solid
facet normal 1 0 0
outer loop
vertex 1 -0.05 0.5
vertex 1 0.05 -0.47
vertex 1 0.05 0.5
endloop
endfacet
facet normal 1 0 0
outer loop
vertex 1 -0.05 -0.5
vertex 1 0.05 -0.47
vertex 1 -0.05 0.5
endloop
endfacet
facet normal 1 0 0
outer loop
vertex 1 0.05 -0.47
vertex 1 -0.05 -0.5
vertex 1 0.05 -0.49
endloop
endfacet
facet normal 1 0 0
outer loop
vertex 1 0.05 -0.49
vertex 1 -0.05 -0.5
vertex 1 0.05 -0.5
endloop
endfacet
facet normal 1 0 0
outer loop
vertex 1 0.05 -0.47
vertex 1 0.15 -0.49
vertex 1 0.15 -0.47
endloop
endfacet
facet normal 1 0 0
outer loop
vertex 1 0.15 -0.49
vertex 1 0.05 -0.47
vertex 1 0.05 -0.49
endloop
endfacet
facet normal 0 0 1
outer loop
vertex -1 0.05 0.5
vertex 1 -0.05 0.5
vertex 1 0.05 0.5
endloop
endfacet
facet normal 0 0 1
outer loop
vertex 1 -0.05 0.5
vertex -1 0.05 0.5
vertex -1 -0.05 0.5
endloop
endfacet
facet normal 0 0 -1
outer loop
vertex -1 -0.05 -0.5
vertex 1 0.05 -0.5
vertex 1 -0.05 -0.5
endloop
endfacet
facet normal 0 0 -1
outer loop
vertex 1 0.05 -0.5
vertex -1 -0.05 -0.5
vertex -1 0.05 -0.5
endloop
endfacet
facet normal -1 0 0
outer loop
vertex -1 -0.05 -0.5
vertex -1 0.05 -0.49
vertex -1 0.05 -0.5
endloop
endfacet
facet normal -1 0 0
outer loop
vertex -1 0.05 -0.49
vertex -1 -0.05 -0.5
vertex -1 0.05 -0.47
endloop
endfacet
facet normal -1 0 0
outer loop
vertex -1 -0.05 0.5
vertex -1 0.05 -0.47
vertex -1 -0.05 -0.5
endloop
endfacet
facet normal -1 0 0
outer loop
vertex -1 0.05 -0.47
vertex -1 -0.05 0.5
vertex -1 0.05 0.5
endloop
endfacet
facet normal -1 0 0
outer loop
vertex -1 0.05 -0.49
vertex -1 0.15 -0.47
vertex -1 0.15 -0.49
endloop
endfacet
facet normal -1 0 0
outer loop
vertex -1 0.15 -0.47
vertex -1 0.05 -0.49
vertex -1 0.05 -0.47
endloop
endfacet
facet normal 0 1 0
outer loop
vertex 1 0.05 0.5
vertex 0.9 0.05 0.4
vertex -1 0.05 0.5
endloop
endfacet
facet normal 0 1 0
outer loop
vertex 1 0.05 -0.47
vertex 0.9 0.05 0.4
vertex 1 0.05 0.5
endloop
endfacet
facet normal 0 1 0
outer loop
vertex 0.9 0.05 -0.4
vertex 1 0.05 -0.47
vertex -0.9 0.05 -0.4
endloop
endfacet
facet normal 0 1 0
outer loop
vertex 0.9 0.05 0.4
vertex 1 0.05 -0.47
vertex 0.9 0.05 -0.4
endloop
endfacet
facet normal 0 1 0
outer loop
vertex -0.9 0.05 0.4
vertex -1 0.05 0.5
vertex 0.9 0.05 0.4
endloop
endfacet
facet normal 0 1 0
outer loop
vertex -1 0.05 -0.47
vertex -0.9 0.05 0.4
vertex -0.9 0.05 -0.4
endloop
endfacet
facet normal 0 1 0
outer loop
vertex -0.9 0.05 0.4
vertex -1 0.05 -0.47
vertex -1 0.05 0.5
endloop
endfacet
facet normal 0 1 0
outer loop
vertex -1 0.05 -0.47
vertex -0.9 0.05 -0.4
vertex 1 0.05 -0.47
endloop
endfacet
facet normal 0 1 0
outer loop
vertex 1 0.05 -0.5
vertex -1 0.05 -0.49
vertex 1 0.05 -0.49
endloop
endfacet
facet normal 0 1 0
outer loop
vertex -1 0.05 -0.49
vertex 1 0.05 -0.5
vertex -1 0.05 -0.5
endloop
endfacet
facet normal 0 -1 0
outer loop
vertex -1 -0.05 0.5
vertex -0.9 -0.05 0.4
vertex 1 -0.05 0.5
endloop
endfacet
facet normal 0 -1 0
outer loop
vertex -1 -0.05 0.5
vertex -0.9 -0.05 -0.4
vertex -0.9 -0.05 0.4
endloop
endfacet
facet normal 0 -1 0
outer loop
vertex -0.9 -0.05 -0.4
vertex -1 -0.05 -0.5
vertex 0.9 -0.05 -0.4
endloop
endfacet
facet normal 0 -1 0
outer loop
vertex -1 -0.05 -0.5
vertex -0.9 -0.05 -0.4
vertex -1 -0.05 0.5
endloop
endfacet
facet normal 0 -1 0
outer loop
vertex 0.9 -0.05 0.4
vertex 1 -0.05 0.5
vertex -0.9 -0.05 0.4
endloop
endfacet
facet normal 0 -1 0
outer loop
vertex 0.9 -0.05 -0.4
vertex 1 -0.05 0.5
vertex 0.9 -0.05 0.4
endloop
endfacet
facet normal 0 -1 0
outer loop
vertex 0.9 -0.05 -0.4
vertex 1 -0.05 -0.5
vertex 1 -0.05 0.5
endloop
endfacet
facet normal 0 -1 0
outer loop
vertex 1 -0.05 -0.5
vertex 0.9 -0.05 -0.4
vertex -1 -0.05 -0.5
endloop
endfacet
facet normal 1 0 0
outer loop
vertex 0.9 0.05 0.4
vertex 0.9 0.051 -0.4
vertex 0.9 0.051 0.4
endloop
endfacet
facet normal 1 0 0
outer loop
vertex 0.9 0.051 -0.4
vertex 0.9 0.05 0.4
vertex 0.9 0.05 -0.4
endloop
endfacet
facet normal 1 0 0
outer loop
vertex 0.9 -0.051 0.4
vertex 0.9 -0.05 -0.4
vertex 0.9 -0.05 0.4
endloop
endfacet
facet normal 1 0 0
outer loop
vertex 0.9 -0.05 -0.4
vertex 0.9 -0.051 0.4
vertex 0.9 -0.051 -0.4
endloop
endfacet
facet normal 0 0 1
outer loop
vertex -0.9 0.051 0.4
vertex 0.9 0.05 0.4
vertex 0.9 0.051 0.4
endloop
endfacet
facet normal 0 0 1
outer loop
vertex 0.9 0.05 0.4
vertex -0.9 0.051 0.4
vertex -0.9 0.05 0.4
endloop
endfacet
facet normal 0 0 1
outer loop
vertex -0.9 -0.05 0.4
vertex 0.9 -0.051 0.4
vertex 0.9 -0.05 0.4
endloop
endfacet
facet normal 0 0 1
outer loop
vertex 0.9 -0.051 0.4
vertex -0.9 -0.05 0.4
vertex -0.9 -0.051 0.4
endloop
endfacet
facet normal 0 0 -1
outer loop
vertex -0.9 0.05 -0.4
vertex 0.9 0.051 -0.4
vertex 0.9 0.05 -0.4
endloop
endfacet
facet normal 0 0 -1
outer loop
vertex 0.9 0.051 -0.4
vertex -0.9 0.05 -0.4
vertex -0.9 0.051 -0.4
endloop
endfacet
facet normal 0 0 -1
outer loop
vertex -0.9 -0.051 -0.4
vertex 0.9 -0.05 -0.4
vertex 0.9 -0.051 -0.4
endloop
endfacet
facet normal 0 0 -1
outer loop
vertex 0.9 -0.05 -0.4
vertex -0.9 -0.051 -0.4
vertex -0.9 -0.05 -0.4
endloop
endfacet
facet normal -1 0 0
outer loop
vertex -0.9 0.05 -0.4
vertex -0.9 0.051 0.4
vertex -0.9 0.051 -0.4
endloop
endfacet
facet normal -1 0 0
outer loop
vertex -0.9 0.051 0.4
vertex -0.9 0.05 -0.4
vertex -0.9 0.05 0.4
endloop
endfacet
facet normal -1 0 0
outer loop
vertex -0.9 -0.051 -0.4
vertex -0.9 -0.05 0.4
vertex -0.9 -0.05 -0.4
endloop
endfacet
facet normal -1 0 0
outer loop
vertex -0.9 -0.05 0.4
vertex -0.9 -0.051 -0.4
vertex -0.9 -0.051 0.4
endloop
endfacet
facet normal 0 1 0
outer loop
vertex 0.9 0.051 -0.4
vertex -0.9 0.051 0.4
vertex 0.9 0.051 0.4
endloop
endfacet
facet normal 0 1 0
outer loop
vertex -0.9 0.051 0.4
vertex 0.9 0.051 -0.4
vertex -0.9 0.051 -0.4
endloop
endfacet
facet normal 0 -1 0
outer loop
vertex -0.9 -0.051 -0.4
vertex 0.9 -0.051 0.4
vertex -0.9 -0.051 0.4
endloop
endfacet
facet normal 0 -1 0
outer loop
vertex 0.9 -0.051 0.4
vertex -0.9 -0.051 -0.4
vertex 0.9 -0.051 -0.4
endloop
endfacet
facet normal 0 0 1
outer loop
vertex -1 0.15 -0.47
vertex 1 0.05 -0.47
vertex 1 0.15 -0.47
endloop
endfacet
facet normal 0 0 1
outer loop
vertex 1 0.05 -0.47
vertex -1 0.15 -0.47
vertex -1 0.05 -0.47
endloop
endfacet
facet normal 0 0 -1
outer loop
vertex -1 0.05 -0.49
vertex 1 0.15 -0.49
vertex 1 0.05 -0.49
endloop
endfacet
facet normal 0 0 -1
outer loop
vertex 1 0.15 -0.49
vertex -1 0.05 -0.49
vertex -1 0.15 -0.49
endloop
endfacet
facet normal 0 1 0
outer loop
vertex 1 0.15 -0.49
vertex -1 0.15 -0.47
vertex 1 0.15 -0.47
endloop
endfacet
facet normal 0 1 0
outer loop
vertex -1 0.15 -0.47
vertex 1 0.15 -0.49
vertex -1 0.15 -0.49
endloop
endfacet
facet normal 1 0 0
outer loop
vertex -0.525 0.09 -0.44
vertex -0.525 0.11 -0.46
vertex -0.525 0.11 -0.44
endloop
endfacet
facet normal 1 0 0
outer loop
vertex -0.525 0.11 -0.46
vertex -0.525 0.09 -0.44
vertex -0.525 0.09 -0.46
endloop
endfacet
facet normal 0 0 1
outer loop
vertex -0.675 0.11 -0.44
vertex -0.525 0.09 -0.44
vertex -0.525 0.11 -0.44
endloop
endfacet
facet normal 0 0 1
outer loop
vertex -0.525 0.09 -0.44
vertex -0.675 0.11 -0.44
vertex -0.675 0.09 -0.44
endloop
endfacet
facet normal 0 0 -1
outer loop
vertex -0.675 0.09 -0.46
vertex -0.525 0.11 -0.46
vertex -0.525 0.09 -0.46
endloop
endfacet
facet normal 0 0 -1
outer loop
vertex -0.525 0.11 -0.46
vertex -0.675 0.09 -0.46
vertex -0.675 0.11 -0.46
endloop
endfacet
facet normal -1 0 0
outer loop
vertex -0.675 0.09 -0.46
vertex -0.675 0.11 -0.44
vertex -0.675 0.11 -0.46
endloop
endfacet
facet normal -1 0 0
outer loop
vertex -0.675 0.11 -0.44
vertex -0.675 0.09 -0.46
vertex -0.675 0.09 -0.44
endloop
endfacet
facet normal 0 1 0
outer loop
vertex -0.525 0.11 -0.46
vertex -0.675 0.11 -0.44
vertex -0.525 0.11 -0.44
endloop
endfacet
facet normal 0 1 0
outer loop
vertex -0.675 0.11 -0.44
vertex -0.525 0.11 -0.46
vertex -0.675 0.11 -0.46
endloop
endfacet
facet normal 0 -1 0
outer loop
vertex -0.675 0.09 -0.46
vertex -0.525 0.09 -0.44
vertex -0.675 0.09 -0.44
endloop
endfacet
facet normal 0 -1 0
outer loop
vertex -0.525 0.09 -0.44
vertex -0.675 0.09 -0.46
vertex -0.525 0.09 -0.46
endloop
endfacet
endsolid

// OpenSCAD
module Chalkboard_01(){
    union(){

    color("#c87d3a")
    cube([2,0.1,1],center =true);

    color("#424e63")
    cube([1.8,0.102,0.8],center =true);


    translate([0,0.1,-0.48])
    color("#8b8f2b")
    cube([2,0.1,0.02],center =true);

    translate([-0.6,0.1,-0.45])
    color("white")
    cube([0.15,0.02,0.02],center =true);
    }

}

Chalkboard_01();

// Written by Nicolì Angelo (Gengio) 2024: 
// MIT License

//Permission is hereby granted, free of charge, to any person obtaining a copy of this software and associated documentation files (the "Software"), to deal in the Software without restriction, including without limitation the rights to use, copy, modify, merge, publish, distribute, sublicense, and/or sell copies of the Software, and to permit persons to whom the Software is furnished to do so, subject to the following conditions:

//The above copyright notice and this permission notice shall be included in all copies or substantial portions of the Software.

//THE SOFTWARE IS PROVIDED "AS IS", WITHOUT WARRANTY OF ANY KIND, EXPRESS OR IMPLIED, INCLUDING BUT NOT LIMITED TO THE WARRANTIES OF MERCHANTABILITY, FITNESS FOR A PARTICULAR PURPOSE AND NONINFRINGEMENT. IN NO EVENT SHALL THE AUTHORS OR COPYRIGHT HOLDERS BE LIABLE FOR ANY CLAIM, DAMAGES OR OTHER LIABILITY, WHETHER IN AN ACTION OF CONTRACT, TORT OR OTHERWISE, ARISING FROM, OUT OF OR IN CONNECTION WITH THE SOFTWARE OR THE USE OR OTHER DEALINGS IN THE SOFTWARE.
